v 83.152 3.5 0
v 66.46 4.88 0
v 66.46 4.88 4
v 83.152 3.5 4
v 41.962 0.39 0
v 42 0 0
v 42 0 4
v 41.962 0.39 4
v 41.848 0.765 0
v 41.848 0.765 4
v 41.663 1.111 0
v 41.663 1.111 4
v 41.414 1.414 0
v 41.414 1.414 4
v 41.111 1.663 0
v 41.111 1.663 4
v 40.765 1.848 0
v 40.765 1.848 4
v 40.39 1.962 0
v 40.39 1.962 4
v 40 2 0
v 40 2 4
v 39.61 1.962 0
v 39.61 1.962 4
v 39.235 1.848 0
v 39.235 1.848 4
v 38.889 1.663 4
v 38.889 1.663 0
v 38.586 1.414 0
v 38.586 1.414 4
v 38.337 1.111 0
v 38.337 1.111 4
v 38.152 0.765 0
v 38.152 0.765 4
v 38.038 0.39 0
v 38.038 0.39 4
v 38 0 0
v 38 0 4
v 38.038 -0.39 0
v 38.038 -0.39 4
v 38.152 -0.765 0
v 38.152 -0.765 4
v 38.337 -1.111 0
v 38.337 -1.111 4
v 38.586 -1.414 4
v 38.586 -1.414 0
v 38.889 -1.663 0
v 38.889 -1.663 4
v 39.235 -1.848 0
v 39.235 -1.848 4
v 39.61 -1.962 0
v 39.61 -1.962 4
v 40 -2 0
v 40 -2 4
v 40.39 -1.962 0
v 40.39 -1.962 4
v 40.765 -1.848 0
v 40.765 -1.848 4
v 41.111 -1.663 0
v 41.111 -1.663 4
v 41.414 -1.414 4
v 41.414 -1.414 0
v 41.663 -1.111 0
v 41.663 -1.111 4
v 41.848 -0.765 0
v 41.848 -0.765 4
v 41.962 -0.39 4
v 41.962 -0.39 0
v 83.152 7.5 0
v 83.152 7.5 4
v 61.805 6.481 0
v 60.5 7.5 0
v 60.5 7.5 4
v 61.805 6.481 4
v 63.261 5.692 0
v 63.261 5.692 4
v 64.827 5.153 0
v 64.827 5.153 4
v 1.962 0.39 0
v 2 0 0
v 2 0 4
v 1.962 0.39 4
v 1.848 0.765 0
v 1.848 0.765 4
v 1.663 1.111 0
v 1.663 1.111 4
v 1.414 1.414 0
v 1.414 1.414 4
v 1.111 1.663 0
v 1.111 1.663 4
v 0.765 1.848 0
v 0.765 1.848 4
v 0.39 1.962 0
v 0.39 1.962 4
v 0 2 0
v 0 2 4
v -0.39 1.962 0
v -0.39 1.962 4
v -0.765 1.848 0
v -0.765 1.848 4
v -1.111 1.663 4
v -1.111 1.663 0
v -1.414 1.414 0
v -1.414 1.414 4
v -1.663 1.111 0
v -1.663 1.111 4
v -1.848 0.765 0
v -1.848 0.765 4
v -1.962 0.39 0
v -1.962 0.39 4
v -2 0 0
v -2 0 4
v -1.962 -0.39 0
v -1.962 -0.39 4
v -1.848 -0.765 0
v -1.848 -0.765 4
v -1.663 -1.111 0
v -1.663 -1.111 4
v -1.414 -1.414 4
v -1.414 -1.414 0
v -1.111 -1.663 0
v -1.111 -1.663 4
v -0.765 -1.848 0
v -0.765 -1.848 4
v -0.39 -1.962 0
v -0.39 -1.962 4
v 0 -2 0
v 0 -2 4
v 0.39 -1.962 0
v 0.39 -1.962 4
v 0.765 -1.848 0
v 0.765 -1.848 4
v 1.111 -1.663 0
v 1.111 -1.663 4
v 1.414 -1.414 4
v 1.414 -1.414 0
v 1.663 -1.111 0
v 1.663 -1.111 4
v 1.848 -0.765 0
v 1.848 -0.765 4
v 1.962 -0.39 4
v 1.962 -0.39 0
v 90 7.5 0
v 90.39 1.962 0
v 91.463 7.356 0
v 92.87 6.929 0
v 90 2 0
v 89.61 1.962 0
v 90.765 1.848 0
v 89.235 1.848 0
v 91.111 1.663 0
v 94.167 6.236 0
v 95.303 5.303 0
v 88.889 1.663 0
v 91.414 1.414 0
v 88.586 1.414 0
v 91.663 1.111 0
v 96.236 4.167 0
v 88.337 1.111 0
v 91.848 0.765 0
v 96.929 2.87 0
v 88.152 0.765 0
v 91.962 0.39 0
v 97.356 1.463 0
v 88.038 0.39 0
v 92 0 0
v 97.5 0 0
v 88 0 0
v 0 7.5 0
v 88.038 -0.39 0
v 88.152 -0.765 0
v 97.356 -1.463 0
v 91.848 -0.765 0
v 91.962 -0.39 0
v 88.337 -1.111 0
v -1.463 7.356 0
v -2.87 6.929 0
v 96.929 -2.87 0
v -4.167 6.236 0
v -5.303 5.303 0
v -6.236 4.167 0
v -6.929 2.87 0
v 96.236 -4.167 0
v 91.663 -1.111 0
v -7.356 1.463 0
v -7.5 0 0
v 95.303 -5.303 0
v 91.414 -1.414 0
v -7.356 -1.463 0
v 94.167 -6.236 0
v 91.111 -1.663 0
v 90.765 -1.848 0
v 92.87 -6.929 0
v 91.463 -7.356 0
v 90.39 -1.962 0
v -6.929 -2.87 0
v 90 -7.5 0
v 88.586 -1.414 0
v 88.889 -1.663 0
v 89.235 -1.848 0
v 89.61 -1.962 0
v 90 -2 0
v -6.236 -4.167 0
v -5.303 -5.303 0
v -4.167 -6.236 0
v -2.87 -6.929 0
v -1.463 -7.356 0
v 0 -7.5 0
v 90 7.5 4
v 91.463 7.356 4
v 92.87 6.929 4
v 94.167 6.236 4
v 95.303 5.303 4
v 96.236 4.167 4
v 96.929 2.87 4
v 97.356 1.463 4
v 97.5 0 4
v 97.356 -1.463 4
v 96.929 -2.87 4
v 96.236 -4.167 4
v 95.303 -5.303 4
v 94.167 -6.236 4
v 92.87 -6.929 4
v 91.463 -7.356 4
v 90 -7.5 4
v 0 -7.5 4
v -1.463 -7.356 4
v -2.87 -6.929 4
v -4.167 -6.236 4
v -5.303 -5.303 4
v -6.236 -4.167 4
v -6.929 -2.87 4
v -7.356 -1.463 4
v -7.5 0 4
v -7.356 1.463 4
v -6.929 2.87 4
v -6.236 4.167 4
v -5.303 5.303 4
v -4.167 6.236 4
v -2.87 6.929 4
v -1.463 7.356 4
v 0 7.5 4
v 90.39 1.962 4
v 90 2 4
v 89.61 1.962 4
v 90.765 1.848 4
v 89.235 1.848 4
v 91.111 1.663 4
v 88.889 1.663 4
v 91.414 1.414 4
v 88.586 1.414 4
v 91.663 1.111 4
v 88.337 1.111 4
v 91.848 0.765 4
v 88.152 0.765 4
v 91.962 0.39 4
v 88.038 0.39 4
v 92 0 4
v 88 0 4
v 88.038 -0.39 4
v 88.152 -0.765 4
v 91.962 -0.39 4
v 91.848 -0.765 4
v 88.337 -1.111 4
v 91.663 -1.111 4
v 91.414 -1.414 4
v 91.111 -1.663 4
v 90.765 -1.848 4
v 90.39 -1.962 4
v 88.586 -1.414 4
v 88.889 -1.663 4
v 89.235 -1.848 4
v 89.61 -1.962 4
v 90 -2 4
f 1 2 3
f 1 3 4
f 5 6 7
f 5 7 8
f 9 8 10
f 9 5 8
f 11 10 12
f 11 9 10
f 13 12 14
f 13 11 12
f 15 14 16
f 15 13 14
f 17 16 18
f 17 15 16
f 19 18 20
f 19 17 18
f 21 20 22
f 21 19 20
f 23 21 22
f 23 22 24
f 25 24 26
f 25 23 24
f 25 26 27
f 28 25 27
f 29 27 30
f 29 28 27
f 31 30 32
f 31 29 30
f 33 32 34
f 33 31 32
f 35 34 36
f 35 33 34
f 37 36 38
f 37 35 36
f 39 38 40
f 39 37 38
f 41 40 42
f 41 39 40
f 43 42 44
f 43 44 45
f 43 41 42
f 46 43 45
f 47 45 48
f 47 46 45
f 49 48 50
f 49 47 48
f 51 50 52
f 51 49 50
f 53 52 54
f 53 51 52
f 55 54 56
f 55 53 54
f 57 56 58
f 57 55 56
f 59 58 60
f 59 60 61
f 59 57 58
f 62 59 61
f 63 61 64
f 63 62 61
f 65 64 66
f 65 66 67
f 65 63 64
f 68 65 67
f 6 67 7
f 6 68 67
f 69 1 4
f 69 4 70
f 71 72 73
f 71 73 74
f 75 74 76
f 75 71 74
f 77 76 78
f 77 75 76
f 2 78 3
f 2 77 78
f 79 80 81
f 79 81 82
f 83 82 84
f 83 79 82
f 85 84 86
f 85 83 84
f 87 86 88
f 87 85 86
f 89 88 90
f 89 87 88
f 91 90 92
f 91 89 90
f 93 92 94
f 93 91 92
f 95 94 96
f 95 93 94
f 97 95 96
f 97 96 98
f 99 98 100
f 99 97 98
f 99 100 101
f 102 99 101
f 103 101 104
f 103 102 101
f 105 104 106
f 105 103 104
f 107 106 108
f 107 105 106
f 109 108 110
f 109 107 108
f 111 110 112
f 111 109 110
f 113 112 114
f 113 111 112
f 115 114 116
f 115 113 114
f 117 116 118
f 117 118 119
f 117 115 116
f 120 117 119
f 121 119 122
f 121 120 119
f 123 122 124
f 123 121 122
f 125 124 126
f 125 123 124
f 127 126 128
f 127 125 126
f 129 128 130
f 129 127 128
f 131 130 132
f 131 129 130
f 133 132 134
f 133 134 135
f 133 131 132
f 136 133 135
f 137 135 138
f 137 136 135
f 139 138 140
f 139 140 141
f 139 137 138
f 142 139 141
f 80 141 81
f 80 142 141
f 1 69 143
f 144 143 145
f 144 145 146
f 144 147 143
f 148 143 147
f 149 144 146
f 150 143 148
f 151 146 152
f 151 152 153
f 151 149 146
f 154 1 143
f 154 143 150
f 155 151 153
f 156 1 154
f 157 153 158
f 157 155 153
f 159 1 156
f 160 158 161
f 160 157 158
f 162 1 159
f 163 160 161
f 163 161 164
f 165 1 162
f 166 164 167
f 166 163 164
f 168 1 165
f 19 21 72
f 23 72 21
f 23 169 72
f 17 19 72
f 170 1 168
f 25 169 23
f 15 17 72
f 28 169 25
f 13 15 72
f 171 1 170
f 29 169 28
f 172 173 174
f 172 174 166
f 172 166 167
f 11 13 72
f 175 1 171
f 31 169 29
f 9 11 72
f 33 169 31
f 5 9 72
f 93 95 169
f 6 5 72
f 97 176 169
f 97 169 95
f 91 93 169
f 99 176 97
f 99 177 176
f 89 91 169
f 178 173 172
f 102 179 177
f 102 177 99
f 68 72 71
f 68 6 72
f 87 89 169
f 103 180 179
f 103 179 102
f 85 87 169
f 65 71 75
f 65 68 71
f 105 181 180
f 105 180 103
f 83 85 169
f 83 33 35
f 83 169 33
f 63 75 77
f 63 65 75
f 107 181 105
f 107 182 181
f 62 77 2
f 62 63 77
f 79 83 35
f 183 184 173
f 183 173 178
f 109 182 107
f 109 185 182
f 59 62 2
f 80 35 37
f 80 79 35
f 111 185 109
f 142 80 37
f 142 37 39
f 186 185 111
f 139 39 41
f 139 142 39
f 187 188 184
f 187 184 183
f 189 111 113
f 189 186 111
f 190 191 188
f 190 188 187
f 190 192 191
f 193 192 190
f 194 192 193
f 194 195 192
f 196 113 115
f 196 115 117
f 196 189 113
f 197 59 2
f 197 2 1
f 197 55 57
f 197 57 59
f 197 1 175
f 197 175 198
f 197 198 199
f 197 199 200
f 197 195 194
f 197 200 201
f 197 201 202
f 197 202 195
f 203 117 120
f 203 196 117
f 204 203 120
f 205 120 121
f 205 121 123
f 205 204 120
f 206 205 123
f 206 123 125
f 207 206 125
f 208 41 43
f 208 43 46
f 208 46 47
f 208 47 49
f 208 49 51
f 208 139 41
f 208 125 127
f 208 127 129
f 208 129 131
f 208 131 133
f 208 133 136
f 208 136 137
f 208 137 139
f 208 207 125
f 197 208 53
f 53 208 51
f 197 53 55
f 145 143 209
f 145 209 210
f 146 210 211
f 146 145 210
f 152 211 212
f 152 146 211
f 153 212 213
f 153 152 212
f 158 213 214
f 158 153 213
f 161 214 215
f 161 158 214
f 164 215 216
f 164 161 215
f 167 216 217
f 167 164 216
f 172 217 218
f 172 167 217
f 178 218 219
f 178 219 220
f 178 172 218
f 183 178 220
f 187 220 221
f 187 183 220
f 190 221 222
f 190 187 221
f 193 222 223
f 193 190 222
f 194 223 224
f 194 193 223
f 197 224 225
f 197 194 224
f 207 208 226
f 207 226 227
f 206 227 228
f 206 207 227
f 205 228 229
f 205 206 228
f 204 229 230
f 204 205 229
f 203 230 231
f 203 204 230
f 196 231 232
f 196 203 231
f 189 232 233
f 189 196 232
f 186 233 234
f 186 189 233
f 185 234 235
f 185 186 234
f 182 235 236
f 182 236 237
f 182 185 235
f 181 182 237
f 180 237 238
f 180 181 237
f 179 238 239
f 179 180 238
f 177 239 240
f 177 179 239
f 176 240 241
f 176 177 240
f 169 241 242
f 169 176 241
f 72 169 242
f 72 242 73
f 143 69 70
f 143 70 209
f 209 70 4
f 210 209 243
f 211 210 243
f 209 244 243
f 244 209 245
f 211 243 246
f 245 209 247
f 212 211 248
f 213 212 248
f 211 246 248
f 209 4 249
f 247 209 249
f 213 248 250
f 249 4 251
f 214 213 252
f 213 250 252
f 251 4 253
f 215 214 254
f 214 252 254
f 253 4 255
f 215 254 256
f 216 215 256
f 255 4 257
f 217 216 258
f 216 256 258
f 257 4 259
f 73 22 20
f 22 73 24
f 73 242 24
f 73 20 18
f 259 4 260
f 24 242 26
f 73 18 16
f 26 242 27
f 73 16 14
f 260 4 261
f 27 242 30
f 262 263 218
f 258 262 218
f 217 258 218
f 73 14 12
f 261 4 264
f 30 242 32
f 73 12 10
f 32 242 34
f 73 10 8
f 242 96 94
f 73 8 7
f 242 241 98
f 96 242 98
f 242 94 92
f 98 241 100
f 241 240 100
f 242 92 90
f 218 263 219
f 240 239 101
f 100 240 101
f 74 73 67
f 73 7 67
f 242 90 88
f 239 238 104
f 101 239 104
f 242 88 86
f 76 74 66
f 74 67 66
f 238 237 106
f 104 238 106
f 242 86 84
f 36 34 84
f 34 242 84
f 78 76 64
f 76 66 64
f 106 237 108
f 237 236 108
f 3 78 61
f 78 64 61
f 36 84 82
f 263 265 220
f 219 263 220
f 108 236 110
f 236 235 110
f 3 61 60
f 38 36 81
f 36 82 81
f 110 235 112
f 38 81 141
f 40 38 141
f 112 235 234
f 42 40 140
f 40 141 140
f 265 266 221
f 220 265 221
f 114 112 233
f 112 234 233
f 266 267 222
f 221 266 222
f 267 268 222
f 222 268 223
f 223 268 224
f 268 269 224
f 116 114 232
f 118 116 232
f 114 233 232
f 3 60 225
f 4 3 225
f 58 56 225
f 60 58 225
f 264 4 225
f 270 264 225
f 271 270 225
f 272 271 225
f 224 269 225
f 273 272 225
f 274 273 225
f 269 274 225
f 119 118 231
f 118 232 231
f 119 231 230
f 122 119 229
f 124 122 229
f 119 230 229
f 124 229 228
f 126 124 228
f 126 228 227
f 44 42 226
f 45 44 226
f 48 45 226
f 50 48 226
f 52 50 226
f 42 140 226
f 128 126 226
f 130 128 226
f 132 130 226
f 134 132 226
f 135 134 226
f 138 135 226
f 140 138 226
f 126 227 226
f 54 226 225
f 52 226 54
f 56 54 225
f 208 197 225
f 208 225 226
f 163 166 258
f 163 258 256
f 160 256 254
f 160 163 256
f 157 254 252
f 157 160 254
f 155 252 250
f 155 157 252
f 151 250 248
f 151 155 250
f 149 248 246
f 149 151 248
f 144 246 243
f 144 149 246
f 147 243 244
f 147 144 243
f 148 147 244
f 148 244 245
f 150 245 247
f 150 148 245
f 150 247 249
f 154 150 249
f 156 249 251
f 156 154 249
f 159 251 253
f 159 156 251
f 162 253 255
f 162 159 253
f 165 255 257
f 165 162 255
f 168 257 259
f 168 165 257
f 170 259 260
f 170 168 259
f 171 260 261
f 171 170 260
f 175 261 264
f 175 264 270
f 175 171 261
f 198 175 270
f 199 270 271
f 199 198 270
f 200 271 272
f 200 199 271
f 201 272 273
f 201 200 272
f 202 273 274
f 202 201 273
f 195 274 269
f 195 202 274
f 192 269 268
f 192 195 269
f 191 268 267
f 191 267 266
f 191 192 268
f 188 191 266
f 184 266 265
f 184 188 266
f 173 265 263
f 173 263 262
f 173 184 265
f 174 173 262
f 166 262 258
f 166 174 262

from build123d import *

# Parameters (mm, degrees)
SKETCH1_R           = 2
BOSS_EXTRUDE1_DEPTH = 4
FILLET1_R           = 10


with BuildPart() as part:
    # Sketch1 → Boss-Extrude1 (new body)
    with BuildSketch(Plane.XY):
        with BuildLine():
            Line((0, 7.5), (60.5, 7.5))
            Line((60.5, 7.5), (62.59580051, 5.2))
            Line((62.59580051, 5.2), (83.151712968, 3.5))
            Line((83.151712968, 3.5), (83.151712968, 7.5))
            Line((83.151712968, 7.5), (90, 7.5))
            ThreePointArc((90, 7.5), (97.5, 0), (90, -7.5))
            Line((90, -7.5), (0, -7.5))
            ThreePointArc((0, -7.5), (-7.5, 0), (0, 7.5))
        make_face()
        Circle(SKETCH1_R, mode=Mode.SUBTRACT)
        with Locations((90, 0)):
            Circle(SKETCH1_R, mode=Mode.SUBTRACT)
        with Locations((40, 0)):
            Circle(SKETCH1_R, mode=Mode.SUBTRACT)
    extrude(amount=BOSS_EXTRUDE1_DEPTH)

    # Fillet1
    # the kernel refuses this fillet: 10 mm, written as the material it adds along each edge
    with BuildSketch(Plane(origin=(62.59580051, 5.2, 0), x_dir=(-0.6735330094671406, 0.7391571451038925, 0), z_dir=(0, 0, 1))) as fillet1_piece_1:
        with BuildLine():
            CenterArc((3.972118366, -9.962911125), FILLET1_R, 94.936211763, 37.995780091)
            Line((-2.839179513, -2.641284173), (-2.97540547, -2.494851634))
            Line((-2.97540547, -2.494851634), (-0.136225958, 0.146432539))
            Line((-0.136225958, 0.146432539), (0, 0.2))
            ThreePointArc((0, 0.2), (1.555826129, 0.2), (3.094442936, 0.199258222))
            Line((3.094442936, 0.199258222), (3.111652259, 0))
        make_face()
    extrude(amount=4)


solid = part.part
